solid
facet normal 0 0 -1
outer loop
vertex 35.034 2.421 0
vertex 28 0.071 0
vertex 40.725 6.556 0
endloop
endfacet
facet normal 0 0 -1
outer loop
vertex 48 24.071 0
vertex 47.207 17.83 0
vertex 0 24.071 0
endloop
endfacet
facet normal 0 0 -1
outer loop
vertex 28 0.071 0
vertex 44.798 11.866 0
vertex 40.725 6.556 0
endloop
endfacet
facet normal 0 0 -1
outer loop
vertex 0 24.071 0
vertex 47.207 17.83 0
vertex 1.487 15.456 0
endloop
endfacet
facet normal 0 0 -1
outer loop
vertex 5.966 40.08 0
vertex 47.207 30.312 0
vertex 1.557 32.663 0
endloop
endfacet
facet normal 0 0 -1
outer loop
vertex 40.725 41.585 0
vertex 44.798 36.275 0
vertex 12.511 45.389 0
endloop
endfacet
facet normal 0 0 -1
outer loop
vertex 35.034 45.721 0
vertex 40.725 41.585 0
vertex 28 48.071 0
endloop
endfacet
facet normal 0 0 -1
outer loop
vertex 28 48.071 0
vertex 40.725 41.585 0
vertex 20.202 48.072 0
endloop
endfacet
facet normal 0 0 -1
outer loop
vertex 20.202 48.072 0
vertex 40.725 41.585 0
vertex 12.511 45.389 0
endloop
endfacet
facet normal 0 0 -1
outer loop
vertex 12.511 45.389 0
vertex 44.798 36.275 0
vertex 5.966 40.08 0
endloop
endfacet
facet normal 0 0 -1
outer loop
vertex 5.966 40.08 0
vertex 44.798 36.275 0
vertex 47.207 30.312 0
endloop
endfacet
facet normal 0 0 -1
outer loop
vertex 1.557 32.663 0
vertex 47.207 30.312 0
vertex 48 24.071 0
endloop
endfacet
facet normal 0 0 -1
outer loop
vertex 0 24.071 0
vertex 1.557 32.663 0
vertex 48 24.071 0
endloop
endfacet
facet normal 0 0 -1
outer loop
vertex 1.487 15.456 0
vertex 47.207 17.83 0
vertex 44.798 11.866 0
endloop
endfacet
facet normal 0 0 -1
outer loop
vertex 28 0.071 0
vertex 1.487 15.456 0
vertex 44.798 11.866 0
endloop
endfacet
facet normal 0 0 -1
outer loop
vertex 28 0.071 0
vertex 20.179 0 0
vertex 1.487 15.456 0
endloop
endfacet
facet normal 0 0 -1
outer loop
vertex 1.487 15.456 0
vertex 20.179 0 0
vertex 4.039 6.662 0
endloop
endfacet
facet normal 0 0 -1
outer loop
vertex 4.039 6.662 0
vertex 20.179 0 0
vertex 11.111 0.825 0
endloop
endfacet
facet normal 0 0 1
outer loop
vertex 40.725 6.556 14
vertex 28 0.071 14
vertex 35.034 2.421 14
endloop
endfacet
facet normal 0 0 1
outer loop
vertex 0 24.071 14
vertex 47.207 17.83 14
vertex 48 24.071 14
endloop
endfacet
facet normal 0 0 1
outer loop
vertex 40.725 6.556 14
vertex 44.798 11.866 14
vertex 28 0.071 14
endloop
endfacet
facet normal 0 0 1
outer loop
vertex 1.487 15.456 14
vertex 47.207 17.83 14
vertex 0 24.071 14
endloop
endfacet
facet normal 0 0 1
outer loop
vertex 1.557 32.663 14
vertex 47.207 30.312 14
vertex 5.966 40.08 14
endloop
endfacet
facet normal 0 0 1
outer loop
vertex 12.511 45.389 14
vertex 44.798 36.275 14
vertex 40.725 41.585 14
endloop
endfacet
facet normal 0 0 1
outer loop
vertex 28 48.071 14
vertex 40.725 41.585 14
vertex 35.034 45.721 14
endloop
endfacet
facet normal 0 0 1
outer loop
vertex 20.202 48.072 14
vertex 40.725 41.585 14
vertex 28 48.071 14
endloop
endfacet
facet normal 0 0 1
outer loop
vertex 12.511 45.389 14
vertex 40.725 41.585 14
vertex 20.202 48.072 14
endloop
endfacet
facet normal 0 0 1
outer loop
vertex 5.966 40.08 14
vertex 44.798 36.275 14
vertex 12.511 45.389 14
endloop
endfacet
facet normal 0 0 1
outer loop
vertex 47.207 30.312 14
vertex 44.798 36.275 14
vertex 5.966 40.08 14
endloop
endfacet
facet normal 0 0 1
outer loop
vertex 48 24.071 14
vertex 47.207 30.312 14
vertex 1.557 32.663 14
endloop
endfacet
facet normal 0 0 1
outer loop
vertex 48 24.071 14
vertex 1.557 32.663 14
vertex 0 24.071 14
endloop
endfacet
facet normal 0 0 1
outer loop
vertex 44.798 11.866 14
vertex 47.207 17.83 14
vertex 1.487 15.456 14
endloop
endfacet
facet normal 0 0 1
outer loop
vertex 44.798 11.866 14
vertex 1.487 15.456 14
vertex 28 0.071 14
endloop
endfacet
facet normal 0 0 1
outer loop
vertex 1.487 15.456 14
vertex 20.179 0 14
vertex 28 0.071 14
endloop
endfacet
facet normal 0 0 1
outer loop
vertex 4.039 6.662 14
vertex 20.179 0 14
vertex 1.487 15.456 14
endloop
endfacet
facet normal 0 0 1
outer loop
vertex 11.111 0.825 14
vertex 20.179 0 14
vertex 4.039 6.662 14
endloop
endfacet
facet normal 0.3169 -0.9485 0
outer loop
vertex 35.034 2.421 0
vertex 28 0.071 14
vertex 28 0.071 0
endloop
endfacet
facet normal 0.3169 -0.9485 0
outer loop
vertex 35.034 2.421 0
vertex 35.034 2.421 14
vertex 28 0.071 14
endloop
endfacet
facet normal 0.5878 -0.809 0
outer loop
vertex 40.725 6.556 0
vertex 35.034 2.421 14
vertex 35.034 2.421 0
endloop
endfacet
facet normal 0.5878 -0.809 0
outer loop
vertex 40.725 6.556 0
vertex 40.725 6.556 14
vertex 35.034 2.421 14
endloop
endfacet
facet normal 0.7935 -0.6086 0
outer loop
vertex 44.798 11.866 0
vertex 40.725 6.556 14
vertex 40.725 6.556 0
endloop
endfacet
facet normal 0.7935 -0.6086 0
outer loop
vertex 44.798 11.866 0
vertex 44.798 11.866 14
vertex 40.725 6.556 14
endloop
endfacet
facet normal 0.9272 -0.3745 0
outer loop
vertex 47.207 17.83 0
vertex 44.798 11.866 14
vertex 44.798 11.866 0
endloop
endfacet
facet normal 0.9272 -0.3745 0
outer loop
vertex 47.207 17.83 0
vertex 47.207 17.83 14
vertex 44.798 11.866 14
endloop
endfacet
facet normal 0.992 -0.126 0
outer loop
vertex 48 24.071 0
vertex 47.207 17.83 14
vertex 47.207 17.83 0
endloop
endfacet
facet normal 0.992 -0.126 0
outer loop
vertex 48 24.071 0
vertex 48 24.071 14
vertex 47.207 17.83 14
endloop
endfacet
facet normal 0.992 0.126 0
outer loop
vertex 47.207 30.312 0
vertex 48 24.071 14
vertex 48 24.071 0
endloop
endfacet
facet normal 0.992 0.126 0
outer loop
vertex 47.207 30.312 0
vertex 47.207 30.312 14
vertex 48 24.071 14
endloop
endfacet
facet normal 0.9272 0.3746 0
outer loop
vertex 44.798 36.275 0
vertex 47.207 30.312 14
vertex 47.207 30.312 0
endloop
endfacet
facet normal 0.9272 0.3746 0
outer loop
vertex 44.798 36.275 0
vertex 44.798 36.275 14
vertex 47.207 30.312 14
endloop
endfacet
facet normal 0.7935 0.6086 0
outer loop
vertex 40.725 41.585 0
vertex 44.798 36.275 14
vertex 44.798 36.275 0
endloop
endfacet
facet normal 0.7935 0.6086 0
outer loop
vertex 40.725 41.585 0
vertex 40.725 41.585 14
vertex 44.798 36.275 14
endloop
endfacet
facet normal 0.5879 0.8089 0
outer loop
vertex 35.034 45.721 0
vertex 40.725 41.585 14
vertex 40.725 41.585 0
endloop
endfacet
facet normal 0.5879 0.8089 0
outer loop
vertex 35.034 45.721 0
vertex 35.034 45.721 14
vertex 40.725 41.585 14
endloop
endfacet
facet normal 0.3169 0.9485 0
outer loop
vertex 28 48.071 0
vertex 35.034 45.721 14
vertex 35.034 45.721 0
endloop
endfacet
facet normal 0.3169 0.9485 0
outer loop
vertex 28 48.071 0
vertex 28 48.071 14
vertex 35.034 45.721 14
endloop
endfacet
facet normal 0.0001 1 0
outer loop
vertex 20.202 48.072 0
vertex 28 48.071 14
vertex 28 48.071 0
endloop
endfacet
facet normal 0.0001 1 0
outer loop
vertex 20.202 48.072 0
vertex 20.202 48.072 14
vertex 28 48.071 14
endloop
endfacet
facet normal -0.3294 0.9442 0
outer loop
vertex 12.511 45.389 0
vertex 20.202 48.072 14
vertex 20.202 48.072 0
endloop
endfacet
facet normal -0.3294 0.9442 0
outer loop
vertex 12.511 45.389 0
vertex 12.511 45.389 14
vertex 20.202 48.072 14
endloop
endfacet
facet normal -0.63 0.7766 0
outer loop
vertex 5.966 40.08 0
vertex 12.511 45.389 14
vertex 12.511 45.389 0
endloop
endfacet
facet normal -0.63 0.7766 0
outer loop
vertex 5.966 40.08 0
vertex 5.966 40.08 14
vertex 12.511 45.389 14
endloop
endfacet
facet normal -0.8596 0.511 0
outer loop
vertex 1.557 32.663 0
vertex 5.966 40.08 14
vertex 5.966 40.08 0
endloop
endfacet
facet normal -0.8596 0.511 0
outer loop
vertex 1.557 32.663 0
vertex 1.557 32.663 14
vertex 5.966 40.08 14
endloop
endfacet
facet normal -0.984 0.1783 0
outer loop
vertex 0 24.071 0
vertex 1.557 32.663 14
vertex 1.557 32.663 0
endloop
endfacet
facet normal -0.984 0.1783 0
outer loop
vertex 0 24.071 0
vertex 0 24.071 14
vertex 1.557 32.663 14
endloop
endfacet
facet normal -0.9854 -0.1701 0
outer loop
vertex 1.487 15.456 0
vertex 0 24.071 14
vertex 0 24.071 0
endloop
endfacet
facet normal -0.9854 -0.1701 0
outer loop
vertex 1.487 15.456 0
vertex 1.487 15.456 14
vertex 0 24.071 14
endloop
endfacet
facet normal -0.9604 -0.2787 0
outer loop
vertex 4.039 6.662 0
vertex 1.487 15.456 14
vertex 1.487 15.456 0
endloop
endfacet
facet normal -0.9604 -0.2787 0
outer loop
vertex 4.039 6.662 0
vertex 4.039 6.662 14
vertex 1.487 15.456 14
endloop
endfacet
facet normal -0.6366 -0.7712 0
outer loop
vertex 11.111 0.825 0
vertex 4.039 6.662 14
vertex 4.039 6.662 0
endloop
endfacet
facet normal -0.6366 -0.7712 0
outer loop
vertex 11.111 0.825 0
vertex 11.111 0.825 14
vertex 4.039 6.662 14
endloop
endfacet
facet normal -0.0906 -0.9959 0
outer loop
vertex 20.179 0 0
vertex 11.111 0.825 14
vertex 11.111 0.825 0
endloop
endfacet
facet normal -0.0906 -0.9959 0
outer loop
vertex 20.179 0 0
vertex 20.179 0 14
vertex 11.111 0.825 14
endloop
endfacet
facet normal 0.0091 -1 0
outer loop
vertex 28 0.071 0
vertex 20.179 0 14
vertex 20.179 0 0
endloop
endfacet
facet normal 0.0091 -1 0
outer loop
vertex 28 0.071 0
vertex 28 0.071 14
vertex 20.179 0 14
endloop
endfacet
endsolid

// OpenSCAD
$fn = 32;

// ----------------------------------------------------------------------
// Cam disc: base radius 20.0 mm, lift 8.0 mm, 20 profile points
// ----------------------------------------------------------------------

// --- parameters (mm) ---
profile_height = 14;      // extrusion height
profile_points = 20;      // points of the closed outline

profile = [[48, 24.071], [47.207, 30.312], [44.798, 36.275], [40.725, 41.585], [35.034, 45.721], [28, 48.071], [20.202, 48.072], [12.511, 45.389], [5.966, 40.08], [1.557, 32.663], [0, 24.071], [1.487, 15.456], [4.039, 6.662], [11.111, 0.825], [20.179, 0], [28, 0.071], [35.034, 2.421], [40.725, 6.556], [44.798, 11.866], [47.207, 17.83]];  // single closed polygon, 20 points, counter clockwise

// --- the one profile operation ---
linear_extrude(height = profile_height) polygon(points = profile);
